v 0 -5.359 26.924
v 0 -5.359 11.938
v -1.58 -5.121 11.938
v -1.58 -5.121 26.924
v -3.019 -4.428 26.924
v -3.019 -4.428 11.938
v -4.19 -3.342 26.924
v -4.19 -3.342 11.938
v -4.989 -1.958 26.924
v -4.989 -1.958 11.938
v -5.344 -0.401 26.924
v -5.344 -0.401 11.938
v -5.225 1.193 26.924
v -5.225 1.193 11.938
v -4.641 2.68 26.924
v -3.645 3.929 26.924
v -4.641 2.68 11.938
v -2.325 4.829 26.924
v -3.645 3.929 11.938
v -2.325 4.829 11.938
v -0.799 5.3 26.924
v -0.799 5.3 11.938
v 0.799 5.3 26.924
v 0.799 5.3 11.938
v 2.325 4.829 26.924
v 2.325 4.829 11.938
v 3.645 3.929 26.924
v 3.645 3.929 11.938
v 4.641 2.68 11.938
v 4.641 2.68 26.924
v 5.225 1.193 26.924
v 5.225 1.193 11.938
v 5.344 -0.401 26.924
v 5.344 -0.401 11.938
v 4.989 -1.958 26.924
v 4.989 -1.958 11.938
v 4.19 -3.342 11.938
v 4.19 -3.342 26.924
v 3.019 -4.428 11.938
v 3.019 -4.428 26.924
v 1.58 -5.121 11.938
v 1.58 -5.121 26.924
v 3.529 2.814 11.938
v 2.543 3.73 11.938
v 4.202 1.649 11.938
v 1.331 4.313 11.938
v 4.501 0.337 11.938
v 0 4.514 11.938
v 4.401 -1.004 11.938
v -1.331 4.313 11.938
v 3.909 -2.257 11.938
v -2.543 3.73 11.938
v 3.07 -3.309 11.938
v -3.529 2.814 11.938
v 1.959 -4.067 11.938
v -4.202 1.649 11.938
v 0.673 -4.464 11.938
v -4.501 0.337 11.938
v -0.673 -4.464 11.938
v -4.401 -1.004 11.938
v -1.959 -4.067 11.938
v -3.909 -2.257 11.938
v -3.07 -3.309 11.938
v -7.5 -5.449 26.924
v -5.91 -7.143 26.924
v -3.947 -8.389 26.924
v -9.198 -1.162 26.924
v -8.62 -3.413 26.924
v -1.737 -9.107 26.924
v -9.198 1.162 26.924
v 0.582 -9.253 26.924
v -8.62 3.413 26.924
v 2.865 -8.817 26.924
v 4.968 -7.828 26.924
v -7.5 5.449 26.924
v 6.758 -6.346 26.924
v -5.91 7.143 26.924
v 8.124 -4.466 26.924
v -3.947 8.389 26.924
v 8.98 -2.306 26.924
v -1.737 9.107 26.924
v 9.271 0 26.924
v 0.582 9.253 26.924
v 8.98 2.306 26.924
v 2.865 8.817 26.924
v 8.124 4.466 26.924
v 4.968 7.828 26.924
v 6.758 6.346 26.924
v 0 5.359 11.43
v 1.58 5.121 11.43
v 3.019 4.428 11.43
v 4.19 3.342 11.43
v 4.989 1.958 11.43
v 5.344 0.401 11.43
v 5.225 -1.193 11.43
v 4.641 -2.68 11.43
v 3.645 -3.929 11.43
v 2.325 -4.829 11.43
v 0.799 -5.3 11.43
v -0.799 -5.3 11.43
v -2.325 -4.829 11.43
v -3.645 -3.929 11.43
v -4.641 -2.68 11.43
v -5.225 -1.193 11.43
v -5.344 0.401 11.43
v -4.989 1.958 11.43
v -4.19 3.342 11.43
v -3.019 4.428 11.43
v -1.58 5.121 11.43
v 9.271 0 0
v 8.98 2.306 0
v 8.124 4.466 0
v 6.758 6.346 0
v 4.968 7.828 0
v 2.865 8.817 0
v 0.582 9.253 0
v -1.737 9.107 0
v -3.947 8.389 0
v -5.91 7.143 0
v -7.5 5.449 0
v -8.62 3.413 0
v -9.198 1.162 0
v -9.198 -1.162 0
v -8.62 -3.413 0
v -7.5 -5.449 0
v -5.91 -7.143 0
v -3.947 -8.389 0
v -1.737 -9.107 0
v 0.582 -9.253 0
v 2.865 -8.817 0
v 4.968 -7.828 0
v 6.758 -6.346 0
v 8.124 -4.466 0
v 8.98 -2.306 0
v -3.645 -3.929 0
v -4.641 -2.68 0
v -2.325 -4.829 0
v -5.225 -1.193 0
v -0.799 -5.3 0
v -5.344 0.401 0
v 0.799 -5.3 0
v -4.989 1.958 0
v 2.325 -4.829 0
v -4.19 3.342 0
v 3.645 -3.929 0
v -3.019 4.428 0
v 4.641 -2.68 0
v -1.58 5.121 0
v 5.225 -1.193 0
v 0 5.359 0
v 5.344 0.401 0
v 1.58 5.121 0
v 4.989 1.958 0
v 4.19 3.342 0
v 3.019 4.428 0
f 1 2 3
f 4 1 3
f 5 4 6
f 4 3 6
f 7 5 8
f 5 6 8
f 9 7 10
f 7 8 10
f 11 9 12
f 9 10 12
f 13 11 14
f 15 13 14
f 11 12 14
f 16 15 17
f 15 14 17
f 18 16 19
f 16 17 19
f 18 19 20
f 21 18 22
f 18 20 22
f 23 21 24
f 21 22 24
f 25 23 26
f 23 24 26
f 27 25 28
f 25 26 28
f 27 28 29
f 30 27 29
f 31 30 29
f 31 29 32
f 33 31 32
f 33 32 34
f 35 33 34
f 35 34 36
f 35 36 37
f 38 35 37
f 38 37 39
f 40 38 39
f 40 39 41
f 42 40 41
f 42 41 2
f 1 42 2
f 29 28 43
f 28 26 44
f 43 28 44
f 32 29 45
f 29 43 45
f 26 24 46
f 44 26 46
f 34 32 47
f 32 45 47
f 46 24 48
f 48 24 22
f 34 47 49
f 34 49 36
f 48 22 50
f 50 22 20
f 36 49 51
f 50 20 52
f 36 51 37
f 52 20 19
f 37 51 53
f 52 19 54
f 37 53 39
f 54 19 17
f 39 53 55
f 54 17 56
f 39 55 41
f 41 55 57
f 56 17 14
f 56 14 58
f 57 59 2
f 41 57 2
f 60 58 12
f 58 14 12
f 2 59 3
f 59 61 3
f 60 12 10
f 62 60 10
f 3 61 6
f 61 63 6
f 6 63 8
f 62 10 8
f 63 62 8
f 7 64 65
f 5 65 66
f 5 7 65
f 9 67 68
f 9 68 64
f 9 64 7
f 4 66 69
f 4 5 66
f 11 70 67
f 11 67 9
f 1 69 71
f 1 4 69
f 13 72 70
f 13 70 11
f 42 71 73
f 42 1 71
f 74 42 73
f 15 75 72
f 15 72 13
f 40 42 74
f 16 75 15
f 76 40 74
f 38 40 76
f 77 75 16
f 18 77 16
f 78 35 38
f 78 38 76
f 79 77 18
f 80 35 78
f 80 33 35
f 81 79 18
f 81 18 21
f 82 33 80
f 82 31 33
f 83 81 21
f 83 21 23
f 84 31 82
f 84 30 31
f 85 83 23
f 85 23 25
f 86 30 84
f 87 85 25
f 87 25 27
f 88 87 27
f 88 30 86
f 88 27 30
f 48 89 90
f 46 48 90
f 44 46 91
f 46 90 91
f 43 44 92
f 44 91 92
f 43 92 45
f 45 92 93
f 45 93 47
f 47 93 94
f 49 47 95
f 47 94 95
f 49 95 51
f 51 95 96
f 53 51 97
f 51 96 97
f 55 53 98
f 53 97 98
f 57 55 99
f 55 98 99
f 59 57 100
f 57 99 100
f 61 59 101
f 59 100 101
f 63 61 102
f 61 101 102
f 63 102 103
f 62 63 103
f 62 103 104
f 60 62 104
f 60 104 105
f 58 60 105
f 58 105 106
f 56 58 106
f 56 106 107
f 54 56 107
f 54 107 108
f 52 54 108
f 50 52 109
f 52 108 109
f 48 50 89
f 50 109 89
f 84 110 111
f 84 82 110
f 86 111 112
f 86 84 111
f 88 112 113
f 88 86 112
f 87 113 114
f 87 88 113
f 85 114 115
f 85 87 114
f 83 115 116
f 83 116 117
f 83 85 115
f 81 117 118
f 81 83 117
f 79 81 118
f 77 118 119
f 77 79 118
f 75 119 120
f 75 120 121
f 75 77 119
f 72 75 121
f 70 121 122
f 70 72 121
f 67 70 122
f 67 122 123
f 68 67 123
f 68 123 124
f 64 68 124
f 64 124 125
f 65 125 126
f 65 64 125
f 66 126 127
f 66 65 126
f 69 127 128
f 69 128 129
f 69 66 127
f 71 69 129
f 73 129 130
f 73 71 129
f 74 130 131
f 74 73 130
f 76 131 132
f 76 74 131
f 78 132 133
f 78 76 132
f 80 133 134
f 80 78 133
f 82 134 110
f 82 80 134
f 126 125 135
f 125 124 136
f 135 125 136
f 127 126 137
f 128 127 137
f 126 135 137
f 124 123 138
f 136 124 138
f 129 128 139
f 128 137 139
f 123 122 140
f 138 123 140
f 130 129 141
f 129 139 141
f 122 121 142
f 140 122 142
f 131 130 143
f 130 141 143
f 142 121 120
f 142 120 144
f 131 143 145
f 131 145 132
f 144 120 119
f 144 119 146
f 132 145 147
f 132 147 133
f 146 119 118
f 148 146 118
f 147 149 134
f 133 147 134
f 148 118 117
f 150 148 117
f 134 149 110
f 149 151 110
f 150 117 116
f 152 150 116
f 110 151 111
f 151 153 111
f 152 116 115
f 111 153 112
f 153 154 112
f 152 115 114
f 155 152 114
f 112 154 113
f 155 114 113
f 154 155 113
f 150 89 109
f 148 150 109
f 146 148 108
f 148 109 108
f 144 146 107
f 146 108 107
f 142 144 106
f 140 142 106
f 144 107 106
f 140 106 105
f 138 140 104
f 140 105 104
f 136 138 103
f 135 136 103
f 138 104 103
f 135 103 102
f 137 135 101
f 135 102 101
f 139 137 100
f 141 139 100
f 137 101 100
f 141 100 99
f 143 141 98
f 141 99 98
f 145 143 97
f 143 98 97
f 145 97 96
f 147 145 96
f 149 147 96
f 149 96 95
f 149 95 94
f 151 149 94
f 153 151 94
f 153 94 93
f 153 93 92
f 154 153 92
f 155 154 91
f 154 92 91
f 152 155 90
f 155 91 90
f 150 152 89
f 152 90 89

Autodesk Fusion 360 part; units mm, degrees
cylinder "CylinderPrimitive1" add diameter 18.542 height 26.924 placed x (1, 0, 0) y (0, 1, 0) z (0, 0, 1) at (0, 0, 0)
hole "Hole1" at (0, 0, 26.924) direction (0, 0, -1) diameter 10.7188 depth 14.986 tip angle 180
hole "Hole4" at (0, 0, 0) direction (0, 0, 1) diameter 10.7188 depth 11.43 tip angle 118
